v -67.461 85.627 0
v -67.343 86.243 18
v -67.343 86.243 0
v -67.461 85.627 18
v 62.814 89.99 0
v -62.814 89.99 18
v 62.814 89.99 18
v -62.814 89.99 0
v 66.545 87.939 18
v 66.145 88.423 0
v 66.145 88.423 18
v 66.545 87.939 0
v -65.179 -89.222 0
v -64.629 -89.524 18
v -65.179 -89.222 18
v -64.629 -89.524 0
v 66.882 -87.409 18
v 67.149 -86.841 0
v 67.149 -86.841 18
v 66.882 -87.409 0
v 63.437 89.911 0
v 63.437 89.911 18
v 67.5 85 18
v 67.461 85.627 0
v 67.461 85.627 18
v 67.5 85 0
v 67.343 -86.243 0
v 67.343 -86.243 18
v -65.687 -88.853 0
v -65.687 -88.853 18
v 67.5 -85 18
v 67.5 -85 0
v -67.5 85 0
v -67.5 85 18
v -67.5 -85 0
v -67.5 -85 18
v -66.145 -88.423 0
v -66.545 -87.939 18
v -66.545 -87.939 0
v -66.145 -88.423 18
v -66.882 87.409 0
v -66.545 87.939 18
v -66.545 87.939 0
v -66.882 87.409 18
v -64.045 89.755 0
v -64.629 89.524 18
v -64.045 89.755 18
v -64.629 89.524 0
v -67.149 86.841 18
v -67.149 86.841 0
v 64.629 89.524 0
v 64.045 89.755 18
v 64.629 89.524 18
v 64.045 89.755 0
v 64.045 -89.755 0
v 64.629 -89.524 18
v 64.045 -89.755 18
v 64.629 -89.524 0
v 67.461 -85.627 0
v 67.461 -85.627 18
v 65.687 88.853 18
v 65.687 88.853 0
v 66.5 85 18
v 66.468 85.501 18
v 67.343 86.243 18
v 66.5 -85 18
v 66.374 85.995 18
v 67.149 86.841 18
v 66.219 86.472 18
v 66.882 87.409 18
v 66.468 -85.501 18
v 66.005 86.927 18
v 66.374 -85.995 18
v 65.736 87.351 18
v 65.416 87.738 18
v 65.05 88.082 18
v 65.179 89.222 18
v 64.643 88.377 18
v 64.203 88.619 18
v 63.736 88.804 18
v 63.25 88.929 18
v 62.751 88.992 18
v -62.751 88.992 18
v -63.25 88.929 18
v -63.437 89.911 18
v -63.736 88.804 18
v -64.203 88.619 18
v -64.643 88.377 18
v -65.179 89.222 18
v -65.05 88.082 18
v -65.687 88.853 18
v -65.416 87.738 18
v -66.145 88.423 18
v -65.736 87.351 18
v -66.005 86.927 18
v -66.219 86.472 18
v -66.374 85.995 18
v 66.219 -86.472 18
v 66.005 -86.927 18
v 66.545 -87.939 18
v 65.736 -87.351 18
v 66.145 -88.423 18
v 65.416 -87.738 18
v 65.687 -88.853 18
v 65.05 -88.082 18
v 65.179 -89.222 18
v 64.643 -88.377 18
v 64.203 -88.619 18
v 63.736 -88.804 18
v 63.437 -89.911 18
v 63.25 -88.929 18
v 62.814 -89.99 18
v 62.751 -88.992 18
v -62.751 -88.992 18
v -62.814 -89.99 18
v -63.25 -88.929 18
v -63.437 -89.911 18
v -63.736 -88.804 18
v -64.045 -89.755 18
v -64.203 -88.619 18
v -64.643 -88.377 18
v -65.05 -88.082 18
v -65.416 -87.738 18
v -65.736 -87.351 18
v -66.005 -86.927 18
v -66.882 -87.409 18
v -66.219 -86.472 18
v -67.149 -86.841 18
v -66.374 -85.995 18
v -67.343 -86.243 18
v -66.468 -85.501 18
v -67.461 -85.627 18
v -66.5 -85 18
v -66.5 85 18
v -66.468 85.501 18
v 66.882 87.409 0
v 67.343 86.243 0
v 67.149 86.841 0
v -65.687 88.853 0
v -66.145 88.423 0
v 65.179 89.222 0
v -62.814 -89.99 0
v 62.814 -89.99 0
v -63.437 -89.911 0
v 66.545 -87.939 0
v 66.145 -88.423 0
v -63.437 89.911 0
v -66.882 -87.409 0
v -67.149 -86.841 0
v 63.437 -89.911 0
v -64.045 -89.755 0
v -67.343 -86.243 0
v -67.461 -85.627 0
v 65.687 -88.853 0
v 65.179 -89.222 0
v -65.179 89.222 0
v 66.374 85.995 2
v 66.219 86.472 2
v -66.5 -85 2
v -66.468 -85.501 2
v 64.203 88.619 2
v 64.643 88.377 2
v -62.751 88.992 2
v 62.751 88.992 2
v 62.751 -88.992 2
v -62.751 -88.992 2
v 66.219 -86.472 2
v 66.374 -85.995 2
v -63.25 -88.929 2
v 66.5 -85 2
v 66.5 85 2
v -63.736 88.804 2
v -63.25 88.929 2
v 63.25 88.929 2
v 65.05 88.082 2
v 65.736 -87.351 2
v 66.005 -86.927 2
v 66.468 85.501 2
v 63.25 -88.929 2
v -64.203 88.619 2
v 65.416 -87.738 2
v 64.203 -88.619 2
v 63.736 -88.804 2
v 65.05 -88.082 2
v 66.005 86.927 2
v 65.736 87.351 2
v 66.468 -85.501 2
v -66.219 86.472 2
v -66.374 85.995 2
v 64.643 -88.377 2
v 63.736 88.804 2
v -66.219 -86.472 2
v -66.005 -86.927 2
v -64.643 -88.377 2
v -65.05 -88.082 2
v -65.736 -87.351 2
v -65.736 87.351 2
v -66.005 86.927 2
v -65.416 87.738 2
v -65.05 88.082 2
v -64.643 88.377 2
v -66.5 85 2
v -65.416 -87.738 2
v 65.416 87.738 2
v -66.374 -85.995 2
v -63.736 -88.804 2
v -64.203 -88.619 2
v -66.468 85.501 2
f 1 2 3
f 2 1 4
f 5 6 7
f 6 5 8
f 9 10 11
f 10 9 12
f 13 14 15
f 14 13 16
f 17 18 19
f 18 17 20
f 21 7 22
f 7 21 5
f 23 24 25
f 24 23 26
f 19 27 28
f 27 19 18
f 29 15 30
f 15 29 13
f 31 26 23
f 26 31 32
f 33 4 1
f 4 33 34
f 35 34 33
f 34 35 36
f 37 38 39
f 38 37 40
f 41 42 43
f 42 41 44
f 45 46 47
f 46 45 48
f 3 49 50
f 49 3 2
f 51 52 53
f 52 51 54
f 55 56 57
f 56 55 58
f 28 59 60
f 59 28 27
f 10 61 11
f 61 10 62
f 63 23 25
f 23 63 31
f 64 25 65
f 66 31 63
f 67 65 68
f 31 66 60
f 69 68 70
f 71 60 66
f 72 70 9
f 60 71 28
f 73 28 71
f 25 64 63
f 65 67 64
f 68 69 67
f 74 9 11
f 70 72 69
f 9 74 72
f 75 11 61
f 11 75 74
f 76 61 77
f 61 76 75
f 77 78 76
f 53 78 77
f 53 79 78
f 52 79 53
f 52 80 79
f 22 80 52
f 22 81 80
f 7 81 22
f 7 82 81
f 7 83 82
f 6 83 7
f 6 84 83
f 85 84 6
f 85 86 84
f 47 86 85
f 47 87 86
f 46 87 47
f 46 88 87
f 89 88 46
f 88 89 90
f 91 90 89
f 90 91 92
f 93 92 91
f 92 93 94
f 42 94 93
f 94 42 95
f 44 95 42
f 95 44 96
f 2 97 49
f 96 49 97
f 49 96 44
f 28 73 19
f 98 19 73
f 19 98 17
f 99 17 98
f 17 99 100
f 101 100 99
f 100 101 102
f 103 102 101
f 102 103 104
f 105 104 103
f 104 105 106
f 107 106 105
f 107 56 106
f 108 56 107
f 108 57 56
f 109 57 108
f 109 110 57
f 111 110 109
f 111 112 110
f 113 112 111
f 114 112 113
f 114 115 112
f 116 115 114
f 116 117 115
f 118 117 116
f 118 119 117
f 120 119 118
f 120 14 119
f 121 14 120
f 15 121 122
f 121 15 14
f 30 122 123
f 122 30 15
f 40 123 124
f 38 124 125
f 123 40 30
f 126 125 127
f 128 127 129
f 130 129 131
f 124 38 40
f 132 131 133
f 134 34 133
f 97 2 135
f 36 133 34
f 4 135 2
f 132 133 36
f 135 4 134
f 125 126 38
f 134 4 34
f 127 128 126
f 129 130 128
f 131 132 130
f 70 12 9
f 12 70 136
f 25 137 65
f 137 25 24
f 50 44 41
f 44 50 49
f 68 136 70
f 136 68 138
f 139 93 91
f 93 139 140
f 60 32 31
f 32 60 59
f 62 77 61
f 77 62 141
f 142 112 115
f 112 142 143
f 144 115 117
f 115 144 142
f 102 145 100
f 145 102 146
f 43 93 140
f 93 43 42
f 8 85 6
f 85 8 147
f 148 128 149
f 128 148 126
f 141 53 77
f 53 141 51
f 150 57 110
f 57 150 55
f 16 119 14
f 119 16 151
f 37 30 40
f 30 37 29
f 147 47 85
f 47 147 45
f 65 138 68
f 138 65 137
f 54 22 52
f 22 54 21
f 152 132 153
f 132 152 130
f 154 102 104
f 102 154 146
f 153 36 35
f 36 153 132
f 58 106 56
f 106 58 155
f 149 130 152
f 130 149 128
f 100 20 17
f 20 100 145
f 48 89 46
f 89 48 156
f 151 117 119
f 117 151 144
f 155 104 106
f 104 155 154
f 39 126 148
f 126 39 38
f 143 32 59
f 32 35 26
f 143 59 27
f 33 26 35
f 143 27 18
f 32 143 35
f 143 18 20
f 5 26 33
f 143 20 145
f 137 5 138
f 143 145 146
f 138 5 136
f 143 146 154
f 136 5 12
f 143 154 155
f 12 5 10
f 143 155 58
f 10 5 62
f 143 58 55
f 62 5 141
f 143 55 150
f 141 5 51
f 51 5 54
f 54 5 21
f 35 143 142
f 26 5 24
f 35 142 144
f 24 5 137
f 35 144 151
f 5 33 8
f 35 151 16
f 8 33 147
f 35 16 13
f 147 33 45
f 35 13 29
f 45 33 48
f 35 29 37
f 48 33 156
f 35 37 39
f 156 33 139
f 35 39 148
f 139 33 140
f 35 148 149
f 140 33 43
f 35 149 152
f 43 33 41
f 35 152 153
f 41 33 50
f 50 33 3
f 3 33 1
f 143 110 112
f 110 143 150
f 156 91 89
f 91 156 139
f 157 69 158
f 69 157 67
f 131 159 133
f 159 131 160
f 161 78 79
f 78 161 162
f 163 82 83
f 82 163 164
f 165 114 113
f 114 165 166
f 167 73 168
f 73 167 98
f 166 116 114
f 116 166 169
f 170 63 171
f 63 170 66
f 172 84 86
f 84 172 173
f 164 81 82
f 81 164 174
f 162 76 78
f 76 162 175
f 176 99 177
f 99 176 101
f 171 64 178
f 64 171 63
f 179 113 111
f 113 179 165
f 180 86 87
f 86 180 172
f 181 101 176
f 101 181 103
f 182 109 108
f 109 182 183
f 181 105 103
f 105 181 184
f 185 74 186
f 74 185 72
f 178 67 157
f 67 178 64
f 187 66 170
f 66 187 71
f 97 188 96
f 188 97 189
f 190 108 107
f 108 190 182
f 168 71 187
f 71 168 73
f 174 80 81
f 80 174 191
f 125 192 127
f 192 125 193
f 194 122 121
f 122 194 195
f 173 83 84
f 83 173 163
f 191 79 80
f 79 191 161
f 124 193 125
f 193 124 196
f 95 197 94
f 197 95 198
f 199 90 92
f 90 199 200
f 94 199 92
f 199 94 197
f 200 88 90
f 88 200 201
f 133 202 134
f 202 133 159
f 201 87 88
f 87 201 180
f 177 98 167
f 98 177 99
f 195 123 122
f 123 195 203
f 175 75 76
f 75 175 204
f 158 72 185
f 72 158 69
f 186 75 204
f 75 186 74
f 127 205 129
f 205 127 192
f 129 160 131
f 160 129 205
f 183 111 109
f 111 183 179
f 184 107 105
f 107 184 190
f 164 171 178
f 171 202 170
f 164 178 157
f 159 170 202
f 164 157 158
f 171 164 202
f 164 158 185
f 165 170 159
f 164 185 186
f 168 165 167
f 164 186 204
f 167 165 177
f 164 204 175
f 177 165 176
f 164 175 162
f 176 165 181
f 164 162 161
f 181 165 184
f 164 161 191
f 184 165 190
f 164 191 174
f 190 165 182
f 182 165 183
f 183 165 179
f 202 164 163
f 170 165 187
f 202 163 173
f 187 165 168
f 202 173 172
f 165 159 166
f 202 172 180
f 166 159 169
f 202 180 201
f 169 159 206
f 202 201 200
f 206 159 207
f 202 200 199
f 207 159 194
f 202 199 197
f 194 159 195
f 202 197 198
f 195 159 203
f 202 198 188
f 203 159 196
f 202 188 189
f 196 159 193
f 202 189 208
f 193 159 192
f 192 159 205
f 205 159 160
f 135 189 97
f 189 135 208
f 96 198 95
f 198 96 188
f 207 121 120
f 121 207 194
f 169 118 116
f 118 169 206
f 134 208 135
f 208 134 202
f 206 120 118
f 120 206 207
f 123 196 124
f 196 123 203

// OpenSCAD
$fn = 50;


difference() {
	union() {
		hull() {
			translate(v = [-62.5000000000, 85.0000000000, 0]) {
				cylinder(h = 18, r = 5);
			}
			translate(v = [62.5000000000, 85.0000000000, 0]) {
				cylinder(h = 18, r = 5);
			}
			translate(v = [-62.5000000000, -85.0000000000, 0]) {
				cylinder(h = 18, r = 5);
			}
			translate(v = [62.5000000000, -85.0000000000, 0]) {
				cylinder(h = 18, r = 5);
			}
		}
	}
	union() {
		translate(v = [0, 0, 2]) {
			hull() {
				translate(v = [-62.5000000000, 85.0000000000, 0]) {
					cylinder(h = 16, r = 4);
				}
				translate(v = [62.5000000000, 85.0000000000, 0]) {
					cylinder(h = 16, r = 4);
				}
				translate(v = [-62.5000000000, -85.0000000000, 0]) {
					cylinder(h = 16, r = 4);
				}
				translate(v = [62.5000000000, -85.0000000000, 0]) {
					cylinder(h = 16, r = 4);
				}
			}
		}
	}
}
